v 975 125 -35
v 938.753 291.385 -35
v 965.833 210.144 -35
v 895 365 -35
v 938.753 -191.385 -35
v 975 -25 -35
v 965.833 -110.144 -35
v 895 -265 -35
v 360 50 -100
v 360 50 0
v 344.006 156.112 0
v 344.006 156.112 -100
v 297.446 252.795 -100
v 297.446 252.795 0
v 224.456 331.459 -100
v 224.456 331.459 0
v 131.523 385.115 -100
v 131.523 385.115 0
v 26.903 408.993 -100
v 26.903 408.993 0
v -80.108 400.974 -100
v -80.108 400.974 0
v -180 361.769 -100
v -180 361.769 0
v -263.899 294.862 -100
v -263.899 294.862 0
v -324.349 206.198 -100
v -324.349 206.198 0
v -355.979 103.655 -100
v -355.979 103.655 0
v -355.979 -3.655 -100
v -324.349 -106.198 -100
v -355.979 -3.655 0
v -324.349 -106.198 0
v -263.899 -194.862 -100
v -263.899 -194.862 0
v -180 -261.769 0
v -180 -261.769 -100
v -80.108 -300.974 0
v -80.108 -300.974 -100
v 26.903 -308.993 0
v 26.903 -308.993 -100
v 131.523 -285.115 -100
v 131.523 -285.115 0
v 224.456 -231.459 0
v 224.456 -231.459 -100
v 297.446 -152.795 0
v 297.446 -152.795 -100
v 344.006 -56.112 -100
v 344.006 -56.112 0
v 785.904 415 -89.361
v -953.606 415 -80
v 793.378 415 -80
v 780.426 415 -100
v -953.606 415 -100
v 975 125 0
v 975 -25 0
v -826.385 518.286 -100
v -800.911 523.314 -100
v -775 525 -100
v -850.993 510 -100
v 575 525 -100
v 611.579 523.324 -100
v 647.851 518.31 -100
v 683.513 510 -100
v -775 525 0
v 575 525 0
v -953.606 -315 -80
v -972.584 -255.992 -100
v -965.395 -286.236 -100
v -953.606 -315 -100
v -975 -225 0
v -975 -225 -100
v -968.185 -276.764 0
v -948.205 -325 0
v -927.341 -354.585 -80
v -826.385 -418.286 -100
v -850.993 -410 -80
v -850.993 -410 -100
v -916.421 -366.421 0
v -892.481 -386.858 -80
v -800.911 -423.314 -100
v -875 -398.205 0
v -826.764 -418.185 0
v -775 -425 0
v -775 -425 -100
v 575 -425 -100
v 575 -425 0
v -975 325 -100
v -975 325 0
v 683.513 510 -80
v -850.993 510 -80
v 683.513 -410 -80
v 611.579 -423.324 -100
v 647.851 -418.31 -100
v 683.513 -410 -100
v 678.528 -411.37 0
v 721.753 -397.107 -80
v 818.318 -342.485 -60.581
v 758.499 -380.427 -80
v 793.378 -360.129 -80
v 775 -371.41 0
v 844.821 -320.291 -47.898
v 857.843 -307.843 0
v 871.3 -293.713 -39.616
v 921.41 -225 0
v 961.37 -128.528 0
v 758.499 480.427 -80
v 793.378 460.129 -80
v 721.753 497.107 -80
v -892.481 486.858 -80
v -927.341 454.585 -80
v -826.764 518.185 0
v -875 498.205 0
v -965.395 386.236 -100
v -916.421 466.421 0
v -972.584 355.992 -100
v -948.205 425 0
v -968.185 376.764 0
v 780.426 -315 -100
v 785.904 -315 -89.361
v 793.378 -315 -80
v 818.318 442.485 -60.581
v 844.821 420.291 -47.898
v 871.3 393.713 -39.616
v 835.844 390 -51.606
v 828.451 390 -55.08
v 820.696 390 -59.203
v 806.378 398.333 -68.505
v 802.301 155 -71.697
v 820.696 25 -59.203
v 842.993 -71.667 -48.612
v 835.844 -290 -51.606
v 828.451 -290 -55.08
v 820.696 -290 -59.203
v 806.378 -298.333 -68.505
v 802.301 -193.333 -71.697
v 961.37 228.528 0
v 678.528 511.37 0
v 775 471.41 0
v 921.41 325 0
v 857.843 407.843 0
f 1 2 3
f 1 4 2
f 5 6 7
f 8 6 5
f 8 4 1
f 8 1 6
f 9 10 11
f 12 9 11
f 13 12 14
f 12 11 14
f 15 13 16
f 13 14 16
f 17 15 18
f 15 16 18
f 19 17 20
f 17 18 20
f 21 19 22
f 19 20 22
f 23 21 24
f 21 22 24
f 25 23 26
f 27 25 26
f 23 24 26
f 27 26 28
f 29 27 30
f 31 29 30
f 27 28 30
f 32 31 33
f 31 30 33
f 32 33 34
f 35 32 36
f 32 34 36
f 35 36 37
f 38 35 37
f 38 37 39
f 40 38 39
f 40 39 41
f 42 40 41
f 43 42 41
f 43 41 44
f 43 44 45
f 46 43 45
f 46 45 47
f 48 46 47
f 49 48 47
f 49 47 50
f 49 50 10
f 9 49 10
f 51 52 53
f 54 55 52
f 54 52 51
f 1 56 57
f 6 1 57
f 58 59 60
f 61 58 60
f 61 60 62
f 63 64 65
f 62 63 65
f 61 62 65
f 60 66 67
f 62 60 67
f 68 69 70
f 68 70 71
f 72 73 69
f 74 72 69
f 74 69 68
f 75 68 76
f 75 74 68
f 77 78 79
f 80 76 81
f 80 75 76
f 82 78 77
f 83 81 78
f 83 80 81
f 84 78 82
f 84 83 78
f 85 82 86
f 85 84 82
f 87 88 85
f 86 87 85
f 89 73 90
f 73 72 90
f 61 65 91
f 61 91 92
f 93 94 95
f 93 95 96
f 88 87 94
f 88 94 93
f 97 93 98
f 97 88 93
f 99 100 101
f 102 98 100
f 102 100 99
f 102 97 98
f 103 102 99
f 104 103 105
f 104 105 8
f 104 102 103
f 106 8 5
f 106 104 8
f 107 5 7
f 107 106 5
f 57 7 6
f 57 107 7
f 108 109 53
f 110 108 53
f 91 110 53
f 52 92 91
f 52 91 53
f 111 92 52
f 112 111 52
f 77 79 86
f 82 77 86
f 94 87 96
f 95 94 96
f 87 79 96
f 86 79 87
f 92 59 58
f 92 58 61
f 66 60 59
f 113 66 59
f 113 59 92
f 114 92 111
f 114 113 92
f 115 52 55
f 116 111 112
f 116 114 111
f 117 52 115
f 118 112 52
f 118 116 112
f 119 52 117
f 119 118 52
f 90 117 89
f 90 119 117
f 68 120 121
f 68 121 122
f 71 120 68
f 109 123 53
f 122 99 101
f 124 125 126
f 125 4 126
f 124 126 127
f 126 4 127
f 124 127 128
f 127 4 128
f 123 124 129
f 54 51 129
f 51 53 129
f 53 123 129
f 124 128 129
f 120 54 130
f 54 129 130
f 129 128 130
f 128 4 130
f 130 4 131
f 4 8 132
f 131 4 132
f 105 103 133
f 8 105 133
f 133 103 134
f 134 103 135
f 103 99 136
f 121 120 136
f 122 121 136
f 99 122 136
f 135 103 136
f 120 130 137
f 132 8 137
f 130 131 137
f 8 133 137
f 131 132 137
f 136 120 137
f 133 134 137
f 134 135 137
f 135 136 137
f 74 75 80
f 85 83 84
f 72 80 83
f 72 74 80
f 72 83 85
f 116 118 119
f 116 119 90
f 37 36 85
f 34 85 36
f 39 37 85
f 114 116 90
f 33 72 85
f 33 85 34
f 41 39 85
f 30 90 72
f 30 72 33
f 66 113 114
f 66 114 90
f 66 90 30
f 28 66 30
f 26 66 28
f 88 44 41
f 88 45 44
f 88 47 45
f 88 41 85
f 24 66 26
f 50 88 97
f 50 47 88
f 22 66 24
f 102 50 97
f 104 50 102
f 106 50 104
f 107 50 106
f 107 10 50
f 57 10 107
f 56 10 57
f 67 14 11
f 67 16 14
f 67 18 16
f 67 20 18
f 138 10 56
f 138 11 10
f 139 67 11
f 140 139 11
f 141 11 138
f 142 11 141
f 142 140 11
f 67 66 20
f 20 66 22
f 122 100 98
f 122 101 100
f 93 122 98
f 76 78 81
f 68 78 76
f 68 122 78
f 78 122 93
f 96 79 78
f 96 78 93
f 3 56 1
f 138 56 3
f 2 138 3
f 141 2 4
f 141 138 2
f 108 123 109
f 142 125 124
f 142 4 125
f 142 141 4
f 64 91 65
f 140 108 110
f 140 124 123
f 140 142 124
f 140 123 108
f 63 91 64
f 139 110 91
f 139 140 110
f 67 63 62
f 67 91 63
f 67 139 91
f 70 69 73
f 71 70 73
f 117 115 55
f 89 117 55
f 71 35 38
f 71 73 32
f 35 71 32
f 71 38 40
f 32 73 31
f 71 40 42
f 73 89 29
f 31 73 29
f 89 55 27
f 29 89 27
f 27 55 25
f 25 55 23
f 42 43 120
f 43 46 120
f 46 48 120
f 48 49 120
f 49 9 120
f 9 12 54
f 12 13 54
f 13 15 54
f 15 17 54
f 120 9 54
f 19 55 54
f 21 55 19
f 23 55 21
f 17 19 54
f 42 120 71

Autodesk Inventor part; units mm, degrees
ref_plane "YZ Plane" through (0, 0, 0) normal (1, 0, 0) x (0, 1, 0)
ref_plane "XZ Plane" through (0, 0, 0) normal (0, 1, 0) x (-1, 0, 0)
ref_plane "XY Plane" through (0, 0, 0) normal (0, 0, 1) x (1, 0, 0)
sketch "Skizze2" plane through (0, 0, 0) normal (0, 0, 1) x (1, 0, 0)
  line L0 (-775, 525) -> (575, 525)
  line L1 (975, 125) -> (975, -25)
  line L2 (575, -425) -> (-775, -425)
  line L3 (-975, -225) -> (-975, 325)
  arc A0 (975, 125) -> (575, 525) centre (575, 125) ccw
  arc A1 (575, -425) -> (975, -25) centre (575, -25) ccw
  arc A2 (-775, 525) -> (-975, 325) centre (-775, 325) ccw
  arc A3 (-975, -225) -> (-775, -425) centre (-775, -225) ccw
  circle A4 centre (0, 50) radius 360
  point P0 (0, 0)
  point P1 (975, -425)
  point P2 (975, 525)
  point P3 (-975, -425)
  dimension "d0" = 950
  dimension "d1" = 1950
  dimension "d2" = 400
  dimension "d3" = 200
  dimension "d4" = 720
  dimension "d5" = 975
  dimension "d6" = 475
extrude "Extrusion1" add sketch "Skizze2" against normal blind 100
sketch "Skizze3" plane through (-775, -425, 0) normal (0, -1, 0) x (1, 0, 0)
  line L0 (1750, 0) -> (1350, 0) projected
  line L1 (1350, -100) -> (1750, -100) projected
  line L2 (1350, 0) -> (1750, 0)
  line L3 (1750, 0) -> (1750, -100)
  line L4 (1750, -100) -> (1350, -100)
  line L5 (1350, -100) -> (1350, 0)
  line L6 (1750, -100) -> (1679.3683, -100)
  line L7 (1670, -35) -> (1750, -35)
  line L8 (1750, -35) -> (1750, -100)
  ellipse E0 centre (1679.3683, -100) end of major axis (1670, -35) minor radius 127.378 (1670, -35) -> (1555.4261, -100) ccw
  point P0 (775, 0)
  dimension "d11" = 65
  dimension "d12" = 80
extrude "Extrusion2" cut sketch "Skizze3" against normal through all contours L3 L1 E0 L7
sketch "Skizze4" plane through (0, 0, -100) normal (0, 0, -1) x (-1, 0, 0)
  line L0 (975, -410) -> (-975, -410)
  line L1 (-975, -410) -> (-975, -315)
  line L2 (-975, -315) -> (975, -315)
  line L3 (975, -315) -> (975, -410)
  line L4 (975, -225) -> (975, 325) projected
  line L5 (-975, -25) -> (-975, 125) projected
  line L6 (-575, -425) -> (775, -425) projected
  line L7 (975, 415) -> (-975, 415)
  line L8 (-975, 415) -> (-975, 510)
  line L9 (-975, 510) -> (975, 510)
  line L10 (975, 510) -> (975, 415)
  line L11 (775, 525) -> (-575, 525) projected
  point P0 (0, 0)
  dimension "d15" = 95
  dimension "d16" = 0
  dimension "d17" = 0
  dimension "d19" = 15
  dimension "d20" = 95
  dimension "d21" = 0
  dimension "d22" = 0
  dimension "d23" = 15
extrude "Extrusion3" cut sketch "Skizze4" against normal blind 20
sketch "Skizze5" plane through (0, 0, -80) normal (0, 0, -1) x (-1, 0, 0)
  line L0 (953.6057, 415) -> (-793.3777, 415) projected
  line L1 (953.6057, 415) -> (-793.3777, 415)
  line L2 (-793.3777, 415) -> (-793.3777, 460.1286) projected
  line L3 (-793.3777, 415) -> (-793.3777, 460.1286)
  line L4 (-683.5127, 510) -> (850.9934, 510) projected
  line L5 (850.9934, 510) -> (-683.5127, 510)
  arc A0 (-683.5127, 510) -> (-793.3777, 460.1286) centre (-575, 125) ccw
  arc A1 (953.6057, 415) -> (850.9934, 510) centre (775, 325) ccw
  point P0 (0, 0)
sketch "Skizze6" plane through (-953.6057, 415, -100) normal (0, 1, 0) x (1, 0, 0)
  ellipse E0 centre (1857.974, 0) end of major axis (1731.8988, 18.1709) minor radius 65.6716 (1734.0318, 0) -> (1746.9834, -20) ccw projected
  arc A0 (1734.0318, 0) -> (1746.9834, -20) centre (1792.2814, 23.5278) ccw
  line L0 (1734.0318, 0) -> (1856.261, 0)
  line L1 (1856.261, 0) -> (1856.261, -20)
  line L2 (1856.261, -20) -> (1746.9834, -20)
  point P0 (953.6057, -100)
properties part number "XPS" material "Polystyrol"
